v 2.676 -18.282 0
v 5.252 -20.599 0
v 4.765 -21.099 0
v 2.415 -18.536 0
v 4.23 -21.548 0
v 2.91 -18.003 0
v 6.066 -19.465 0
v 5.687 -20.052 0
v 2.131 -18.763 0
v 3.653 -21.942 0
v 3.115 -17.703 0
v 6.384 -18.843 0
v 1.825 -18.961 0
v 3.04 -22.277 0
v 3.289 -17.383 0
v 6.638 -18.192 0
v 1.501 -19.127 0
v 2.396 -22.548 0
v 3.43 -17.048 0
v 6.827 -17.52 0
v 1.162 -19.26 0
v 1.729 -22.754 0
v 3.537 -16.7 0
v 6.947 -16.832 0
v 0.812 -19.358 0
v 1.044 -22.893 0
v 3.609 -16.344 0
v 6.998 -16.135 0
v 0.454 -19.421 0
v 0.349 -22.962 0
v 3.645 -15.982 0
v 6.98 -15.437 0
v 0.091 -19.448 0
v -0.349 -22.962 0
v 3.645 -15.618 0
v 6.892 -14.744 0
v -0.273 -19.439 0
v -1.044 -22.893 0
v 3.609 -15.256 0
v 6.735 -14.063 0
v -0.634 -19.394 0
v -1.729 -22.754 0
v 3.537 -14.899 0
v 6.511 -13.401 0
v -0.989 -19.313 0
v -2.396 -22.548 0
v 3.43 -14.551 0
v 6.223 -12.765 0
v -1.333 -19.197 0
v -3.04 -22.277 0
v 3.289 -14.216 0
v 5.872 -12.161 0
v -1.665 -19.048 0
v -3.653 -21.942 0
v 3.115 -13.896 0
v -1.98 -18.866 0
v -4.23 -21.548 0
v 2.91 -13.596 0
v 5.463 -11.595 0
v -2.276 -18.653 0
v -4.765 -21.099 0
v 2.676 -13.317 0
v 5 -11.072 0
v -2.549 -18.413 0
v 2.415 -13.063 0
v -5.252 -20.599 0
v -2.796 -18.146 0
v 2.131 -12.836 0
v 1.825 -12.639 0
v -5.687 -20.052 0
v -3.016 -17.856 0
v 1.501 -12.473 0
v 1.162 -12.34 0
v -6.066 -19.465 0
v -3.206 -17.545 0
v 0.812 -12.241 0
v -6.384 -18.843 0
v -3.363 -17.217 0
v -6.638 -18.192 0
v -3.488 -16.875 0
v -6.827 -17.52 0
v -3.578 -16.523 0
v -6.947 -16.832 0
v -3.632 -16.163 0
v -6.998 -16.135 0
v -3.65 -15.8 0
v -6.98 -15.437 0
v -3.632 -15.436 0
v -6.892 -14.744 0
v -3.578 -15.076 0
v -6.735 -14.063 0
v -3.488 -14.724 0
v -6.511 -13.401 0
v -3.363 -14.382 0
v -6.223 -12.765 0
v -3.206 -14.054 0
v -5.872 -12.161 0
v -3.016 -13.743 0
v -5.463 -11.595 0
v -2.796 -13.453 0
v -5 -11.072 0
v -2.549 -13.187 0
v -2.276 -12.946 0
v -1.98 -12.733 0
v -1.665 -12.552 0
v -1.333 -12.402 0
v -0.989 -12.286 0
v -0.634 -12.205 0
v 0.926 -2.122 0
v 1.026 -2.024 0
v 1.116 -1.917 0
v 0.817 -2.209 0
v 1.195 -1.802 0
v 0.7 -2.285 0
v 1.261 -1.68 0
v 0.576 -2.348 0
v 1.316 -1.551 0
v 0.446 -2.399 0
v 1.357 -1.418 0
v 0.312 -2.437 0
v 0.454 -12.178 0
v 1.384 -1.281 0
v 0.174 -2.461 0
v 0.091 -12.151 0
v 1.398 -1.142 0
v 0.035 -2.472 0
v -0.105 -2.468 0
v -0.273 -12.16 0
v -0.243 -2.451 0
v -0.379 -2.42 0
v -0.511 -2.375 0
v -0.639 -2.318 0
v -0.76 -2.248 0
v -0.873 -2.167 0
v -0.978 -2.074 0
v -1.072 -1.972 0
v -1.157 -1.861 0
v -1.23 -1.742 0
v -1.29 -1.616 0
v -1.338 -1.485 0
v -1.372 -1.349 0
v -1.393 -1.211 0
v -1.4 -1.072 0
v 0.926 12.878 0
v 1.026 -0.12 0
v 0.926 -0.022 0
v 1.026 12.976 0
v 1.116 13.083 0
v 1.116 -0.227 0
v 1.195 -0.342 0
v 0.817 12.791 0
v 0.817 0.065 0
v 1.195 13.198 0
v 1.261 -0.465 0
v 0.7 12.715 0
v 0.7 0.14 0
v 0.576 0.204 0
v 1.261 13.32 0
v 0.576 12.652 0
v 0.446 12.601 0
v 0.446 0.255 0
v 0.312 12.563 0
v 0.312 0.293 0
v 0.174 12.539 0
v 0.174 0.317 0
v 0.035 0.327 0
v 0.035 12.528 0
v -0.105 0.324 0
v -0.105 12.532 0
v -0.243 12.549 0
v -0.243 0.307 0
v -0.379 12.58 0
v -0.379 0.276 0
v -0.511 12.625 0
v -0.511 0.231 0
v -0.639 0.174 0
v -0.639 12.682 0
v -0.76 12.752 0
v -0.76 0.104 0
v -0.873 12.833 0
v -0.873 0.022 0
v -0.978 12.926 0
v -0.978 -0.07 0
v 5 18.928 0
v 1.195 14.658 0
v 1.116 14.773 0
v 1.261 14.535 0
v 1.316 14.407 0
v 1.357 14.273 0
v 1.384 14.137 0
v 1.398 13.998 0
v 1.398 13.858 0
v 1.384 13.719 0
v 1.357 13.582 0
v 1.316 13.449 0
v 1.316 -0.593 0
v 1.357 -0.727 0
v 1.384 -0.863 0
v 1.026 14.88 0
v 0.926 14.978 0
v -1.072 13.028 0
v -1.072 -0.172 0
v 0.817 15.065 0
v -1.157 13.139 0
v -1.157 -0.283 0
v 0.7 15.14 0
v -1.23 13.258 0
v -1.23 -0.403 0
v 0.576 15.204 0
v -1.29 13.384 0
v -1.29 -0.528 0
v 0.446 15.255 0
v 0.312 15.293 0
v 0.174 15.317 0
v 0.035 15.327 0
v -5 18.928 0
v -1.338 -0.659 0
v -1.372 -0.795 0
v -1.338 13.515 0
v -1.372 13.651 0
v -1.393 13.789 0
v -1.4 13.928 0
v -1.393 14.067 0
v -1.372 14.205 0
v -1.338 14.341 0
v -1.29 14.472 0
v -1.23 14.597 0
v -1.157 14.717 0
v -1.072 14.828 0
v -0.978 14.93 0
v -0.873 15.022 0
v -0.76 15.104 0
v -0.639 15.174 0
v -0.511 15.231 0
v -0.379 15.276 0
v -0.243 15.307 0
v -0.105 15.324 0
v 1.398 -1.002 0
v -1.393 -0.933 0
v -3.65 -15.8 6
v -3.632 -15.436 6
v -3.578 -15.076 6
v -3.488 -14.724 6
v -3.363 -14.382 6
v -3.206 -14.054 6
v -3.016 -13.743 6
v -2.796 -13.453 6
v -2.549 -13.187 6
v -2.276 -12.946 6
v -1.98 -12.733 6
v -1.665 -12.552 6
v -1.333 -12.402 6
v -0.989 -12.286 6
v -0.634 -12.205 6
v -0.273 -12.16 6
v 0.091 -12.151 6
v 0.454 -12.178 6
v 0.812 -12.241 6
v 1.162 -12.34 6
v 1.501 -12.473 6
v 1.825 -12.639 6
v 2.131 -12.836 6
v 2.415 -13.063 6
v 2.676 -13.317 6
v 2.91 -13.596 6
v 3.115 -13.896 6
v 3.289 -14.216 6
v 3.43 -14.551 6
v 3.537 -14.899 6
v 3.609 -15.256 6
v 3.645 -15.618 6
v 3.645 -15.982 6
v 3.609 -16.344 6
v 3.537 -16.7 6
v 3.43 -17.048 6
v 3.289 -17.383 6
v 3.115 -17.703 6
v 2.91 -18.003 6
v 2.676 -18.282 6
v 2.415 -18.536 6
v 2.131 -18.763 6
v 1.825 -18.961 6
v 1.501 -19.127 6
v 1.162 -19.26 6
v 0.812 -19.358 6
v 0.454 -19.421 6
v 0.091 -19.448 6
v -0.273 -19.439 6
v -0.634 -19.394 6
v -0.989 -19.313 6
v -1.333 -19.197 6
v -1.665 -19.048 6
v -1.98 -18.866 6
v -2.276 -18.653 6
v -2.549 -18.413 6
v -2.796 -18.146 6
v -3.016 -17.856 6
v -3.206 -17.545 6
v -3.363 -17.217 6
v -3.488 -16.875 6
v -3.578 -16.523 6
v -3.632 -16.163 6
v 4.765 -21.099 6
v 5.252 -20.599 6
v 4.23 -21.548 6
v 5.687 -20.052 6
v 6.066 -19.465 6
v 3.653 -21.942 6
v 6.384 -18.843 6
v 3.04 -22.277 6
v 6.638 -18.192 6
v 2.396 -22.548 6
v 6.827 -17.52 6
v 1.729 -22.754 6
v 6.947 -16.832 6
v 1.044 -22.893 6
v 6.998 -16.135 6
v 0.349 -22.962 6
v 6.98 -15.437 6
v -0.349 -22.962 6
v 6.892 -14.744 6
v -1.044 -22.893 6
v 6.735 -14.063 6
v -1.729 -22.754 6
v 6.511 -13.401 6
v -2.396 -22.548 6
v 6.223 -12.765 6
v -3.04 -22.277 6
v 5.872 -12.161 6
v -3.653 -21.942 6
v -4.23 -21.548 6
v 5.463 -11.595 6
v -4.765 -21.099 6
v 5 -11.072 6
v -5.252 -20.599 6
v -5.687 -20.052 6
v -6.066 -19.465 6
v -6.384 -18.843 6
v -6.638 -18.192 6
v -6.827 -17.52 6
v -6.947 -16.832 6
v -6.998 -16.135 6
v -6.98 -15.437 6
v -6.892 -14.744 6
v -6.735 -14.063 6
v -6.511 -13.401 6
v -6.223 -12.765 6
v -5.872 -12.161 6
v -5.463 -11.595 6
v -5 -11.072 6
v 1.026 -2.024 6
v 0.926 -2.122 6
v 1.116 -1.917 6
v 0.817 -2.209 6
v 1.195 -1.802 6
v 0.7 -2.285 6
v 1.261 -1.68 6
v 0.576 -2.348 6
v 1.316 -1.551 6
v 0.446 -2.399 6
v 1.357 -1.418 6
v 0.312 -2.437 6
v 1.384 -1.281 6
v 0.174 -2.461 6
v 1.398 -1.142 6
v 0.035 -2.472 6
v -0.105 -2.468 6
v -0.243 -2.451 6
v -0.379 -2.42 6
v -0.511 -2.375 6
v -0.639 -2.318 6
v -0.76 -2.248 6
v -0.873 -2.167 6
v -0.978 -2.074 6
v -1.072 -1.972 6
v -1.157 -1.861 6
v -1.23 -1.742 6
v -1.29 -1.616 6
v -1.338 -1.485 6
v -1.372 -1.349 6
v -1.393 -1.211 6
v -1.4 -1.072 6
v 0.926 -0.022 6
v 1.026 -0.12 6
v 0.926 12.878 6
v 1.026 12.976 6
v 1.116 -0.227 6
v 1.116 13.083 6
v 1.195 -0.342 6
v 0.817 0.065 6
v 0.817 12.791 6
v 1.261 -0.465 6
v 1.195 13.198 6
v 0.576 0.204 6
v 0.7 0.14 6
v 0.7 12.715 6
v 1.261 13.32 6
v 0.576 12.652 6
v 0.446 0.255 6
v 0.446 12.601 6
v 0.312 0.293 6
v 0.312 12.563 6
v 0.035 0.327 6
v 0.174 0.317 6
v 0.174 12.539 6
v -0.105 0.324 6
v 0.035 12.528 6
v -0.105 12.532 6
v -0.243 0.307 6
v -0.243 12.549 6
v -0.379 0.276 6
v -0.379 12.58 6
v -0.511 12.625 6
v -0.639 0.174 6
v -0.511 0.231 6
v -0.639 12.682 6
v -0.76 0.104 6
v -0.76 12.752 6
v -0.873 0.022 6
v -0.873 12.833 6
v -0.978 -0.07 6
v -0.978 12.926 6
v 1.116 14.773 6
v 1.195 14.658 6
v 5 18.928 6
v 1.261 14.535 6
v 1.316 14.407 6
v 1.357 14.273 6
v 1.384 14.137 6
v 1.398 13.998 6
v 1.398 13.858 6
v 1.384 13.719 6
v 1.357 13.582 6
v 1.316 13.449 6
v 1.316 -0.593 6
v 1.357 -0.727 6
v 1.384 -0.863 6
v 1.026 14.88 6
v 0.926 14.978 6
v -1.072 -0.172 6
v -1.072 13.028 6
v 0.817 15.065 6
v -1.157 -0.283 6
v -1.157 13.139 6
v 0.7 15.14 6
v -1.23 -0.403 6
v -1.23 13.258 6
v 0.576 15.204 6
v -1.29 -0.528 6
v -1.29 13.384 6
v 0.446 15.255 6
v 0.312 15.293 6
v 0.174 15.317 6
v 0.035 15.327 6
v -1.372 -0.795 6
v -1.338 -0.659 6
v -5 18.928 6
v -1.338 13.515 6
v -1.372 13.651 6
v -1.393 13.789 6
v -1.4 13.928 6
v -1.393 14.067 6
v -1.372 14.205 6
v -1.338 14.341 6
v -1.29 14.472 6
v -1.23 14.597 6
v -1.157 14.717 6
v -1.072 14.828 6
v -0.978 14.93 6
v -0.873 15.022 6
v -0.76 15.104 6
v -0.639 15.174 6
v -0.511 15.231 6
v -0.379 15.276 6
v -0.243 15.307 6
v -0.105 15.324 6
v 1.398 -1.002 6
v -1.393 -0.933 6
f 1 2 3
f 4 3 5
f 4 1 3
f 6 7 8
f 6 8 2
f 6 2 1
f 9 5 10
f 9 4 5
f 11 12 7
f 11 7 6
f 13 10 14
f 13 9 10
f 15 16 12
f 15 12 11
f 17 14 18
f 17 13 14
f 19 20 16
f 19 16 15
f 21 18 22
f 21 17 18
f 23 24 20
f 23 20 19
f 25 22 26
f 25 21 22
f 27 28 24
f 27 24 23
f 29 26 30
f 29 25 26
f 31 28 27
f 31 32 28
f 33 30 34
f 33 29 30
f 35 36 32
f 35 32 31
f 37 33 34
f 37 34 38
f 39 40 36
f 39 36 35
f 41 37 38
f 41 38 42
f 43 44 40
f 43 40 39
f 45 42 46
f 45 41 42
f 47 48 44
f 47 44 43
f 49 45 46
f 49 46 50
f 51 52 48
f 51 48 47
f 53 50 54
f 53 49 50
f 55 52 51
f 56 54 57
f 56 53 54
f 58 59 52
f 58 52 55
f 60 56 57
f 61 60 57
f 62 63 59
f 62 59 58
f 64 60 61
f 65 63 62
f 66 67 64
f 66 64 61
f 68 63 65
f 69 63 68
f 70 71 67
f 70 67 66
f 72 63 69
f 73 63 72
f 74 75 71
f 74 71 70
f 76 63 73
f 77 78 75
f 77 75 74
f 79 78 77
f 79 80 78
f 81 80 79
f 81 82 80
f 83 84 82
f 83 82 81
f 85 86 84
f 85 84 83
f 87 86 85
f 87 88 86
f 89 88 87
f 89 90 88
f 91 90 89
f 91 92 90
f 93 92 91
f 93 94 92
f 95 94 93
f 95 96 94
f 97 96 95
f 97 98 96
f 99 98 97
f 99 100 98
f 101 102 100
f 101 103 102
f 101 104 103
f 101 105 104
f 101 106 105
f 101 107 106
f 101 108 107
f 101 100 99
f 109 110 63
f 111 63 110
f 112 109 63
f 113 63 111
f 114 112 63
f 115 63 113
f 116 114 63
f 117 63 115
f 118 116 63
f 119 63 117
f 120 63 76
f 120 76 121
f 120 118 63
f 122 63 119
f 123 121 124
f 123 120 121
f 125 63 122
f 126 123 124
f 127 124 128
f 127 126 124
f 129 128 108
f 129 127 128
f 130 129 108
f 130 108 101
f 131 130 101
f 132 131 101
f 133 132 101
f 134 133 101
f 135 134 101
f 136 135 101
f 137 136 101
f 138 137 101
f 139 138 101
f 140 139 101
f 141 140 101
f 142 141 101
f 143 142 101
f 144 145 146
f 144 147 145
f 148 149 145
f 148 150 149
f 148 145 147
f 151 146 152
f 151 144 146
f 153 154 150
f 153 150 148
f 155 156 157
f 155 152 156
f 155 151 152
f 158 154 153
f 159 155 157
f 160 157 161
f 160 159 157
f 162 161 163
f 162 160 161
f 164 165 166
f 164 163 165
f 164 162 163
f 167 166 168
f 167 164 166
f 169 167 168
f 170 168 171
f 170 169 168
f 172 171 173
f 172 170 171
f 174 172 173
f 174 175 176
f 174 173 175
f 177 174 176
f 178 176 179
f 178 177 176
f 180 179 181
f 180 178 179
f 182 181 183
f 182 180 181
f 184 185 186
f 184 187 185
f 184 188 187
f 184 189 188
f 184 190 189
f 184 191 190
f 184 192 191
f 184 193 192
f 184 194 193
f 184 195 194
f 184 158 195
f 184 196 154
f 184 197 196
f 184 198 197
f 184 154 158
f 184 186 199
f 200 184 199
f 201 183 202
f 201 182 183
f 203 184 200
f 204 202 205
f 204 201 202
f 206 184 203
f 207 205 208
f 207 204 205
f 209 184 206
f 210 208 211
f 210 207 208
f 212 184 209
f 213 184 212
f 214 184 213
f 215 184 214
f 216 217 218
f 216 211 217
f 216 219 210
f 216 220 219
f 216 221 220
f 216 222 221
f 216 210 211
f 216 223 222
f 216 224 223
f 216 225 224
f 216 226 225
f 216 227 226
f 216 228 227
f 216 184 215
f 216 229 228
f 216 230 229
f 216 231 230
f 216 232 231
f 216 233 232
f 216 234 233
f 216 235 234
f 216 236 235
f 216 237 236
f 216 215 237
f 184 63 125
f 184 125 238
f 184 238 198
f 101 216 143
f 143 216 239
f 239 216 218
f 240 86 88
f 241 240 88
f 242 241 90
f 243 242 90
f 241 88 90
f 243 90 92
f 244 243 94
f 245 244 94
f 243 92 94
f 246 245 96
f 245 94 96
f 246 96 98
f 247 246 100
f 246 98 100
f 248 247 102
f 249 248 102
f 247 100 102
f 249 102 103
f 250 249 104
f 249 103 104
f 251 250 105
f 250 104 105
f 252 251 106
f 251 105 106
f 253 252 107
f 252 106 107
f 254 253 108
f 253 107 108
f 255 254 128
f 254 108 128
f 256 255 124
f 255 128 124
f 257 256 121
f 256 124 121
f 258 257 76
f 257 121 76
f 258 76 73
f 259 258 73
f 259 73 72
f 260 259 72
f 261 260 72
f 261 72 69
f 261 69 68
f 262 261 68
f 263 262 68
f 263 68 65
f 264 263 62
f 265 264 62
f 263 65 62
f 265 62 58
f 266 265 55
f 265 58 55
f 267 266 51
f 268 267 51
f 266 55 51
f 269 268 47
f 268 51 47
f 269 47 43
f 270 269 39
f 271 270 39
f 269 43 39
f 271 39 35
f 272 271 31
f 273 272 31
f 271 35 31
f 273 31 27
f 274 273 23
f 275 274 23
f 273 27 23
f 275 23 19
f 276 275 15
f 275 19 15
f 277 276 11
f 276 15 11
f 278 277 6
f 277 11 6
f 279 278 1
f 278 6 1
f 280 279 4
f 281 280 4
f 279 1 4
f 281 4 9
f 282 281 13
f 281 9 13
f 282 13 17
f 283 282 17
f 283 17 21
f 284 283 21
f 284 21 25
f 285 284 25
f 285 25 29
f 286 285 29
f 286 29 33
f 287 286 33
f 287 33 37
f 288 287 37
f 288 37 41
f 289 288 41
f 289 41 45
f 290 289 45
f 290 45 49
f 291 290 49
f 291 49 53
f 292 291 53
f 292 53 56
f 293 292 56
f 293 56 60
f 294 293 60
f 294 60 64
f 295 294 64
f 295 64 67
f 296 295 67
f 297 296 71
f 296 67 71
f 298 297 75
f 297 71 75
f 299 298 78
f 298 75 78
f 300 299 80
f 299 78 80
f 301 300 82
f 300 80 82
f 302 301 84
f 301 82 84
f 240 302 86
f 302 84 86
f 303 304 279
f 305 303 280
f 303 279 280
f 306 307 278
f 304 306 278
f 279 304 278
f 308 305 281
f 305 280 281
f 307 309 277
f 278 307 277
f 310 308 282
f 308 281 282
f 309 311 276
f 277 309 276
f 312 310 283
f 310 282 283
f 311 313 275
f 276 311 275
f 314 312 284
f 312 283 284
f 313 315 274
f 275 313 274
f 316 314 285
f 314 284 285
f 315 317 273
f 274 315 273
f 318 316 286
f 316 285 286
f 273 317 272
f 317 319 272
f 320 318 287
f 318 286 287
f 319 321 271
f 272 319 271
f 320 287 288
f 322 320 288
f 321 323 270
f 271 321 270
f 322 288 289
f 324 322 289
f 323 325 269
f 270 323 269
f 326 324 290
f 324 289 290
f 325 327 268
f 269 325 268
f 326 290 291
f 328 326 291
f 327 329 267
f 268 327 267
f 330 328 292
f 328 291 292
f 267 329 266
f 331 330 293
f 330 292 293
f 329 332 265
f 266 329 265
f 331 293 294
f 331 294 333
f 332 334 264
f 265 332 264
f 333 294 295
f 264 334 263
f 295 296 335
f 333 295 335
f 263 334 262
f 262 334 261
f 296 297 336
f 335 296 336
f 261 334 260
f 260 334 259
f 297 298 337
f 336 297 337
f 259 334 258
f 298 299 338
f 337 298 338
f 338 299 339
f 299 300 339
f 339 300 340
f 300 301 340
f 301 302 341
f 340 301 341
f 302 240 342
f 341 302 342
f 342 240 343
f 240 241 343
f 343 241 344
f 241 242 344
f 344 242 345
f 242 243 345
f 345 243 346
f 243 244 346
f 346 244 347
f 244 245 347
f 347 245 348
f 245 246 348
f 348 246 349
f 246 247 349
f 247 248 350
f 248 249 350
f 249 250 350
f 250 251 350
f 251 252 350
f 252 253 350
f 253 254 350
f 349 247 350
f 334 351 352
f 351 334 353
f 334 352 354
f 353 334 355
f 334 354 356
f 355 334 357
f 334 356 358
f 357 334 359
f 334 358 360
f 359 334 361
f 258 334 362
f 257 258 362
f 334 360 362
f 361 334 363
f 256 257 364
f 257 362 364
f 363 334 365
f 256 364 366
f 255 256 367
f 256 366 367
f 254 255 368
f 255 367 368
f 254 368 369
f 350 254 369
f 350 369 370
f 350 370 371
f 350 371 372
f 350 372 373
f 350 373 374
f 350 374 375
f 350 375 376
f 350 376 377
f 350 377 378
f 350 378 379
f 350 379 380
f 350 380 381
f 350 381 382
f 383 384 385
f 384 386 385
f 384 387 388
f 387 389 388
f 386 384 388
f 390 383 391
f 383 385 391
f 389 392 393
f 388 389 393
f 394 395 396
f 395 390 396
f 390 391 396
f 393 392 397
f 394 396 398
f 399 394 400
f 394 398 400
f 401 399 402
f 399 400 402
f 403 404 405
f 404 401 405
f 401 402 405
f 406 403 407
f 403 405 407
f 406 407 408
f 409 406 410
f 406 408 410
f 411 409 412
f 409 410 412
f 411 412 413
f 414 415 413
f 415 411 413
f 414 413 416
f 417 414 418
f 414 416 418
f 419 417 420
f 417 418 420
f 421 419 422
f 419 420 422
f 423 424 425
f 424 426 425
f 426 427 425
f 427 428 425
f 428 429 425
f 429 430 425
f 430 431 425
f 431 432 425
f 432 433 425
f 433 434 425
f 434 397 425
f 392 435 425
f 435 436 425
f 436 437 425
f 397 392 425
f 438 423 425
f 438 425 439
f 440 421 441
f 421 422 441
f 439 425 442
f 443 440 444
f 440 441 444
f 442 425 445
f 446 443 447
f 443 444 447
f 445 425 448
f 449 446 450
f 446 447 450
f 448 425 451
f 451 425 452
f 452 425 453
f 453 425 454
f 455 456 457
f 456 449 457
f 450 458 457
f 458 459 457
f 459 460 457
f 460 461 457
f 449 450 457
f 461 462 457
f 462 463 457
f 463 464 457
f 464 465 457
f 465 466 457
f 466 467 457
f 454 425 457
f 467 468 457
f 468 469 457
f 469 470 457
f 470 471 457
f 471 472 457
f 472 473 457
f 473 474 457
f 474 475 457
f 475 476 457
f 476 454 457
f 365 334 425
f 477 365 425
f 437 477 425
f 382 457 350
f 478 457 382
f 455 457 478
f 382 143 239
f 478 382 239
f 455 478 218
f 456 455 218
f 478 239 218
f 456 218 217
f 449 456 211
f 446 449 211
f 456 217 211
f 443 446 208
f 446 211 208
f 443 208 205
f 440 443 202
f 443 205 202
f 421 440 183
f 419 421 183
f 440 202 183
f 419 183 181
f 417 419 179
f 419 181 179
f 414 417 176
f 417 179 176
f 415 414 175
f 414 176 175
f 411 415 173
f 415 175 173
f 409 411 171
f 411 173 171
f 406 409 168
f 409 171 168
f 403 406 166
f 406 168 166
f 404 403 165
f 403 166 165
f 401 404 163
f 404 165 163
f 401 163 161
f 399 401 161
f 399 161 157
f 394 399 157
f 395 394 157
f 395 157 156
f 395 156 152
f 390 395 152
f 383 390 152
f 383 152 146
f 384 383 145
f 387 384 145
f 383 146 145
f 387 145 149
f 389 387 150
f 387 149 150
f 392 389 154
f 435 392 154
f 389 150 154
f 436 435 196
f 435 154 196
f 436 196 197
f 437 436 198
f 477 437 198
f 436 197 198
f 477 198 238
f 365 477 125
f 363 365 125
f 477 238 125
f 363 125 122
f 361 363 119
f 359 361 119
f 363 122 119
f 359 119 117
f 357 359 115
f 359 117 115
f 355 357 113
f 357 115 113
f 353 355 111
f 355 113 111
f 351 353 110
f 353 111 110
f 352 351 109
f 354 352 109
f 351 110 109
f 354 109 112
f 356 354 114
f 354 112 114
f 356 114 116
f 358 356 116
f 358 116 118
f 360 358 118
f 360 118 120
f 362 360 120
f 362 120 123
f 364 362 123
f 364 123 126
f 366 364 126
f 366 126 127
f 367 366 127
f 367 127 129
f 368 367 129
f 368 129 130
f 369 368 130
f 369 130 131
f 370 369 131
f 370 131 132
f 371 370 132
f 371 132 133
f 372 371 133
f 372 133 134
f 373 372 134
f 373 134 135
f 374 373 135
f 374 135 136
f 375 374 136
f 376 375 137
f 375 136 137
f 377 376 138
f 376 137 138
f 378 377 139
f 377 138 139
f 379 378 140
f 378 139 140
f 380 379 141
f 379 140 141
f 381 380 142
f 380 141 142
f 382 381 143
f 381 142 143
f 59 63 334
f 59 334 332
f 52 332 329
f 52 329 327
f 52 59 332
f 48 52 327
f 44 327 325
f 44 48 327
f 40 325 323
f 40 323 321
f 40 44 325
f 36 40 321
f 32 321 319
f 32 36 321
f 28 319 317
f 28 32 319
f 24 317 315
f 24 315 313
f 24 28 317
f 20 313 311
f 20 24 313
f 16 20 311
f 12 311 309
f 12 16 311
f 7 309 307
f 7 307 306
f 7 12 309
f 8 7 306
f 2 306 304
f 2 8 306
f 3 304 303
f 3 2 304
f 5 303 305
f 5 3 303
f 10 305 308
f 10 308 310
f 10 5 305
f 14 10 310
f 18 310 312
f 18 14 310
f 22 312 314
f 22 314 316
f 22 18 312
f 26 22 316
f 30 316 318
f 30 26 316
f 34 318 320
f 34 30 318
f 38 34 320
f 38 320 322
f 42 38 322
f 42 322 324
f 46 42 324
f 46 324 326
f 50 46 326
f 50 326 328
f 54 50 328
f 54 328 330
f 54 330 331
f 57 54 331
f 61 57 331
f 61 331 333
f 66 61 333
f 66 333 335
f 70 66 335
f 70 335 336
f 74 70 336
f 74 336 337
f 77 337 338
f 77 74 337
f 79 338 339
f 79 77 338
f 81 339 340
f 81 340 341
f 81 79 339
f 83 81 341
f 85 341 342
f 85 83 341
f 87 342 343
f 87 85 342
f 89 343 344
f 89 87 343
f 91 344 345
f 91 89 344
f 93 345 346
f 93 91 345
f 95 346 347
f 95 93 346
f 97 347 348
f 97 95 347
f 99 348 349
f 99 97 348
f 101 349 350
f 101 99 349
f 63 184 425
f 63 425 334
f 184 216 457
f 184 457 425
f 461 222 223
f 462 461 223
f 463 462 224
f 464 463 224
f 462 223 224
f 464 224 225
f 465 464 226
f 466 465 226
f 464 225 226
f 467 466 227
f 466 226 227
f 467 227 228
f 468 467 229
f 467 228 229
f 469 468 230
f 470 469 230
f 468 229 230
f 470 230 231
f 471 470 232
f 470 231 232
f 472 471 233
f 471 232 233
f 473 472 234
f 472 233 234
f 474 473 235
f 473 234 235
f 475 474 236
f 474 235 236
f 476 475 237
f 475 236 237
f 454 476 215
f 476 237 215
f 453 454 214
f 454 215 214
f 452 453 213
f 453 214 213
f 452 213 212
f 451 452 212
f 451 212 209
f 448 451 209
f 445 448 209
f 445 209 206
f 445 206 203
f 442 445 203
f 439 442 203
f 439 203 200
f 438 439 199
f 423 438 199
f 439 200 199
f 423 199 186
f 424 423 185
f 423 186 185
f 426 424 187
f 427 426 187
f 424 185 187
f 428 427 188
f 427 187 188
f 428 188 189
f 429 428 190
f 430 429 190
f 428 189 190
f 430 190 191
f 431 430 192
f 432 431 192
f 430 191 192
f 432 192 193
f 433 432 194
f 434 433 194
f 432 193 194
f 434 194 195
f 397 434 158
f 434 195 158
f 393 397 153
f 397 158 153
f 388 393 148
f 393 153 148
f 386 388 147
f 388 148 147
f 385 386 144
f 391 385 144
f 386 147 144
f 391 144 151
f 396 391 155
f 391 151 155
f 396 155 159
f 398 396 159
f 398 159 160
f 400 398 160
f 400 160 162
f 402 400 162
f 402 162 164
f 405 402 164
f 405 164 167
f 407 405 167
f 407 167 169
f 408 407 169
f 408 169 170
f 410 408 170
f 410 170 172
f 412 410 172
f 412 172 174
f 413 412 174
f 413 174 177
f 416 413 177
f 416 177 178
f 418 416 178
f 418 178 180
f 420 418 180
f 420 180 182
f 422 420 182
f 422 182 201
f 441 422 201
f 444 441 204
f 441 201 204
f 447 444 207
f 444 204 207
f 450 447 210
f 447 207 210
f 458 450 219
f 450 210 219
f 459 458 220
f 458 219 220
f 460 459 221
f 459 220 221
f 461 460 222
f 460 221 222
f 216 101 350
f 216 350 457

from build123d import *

# Parameters (mm, degrees)
BOSS_EXTRU_1_DEPTH      = 6
ESQUISSE2_R             = 3.65
ESQUISSE2_R_2           = 1.4
ENL_V_MAT_EXTRU_1_DEPTH = 6


with BuildPart() as part:
    # Esquisse1 → Boss.-Extru.1 (new body)
    with BuildSketch(Plane.XY):
        with BuildLine():
            Line((-5, 18.927916642), (5, 18.927916642))
            Line((5, 18.927916642), (5, -11.072083358))
            ThreePointArc((5, -11.072083358), (0, -22.971062844), (-5, -11.072083358))
            Line((-5, -11.072083358), (-5, 18.927916642))
        make_face()
    extrude(amount=BOSS_EXTRU_1_DEPTH)

    # Esquisse2 → Enlèv. mat.-Extru.1 (cut)
    with BuildSketch(Plane(origin=(0, 0, 0), x_dir=(-1, 0, 0), z_dir=(0, 0, -1))):
        with Locations((0, -15.799586654)):
            Circle(ESQUISSE2_R)
        with Locations((0, -1.072083358)):
            Circle(ESQUISSE2_R_2)
        with Locations((0, 13.927916642)):
            Circle(ESQUISSE2_R_2)
    extrude(amount=-ENL_V_MAT_EXTRU_1_DEPTH, mode=Mode.SUBTRACT)


solid = part.part
